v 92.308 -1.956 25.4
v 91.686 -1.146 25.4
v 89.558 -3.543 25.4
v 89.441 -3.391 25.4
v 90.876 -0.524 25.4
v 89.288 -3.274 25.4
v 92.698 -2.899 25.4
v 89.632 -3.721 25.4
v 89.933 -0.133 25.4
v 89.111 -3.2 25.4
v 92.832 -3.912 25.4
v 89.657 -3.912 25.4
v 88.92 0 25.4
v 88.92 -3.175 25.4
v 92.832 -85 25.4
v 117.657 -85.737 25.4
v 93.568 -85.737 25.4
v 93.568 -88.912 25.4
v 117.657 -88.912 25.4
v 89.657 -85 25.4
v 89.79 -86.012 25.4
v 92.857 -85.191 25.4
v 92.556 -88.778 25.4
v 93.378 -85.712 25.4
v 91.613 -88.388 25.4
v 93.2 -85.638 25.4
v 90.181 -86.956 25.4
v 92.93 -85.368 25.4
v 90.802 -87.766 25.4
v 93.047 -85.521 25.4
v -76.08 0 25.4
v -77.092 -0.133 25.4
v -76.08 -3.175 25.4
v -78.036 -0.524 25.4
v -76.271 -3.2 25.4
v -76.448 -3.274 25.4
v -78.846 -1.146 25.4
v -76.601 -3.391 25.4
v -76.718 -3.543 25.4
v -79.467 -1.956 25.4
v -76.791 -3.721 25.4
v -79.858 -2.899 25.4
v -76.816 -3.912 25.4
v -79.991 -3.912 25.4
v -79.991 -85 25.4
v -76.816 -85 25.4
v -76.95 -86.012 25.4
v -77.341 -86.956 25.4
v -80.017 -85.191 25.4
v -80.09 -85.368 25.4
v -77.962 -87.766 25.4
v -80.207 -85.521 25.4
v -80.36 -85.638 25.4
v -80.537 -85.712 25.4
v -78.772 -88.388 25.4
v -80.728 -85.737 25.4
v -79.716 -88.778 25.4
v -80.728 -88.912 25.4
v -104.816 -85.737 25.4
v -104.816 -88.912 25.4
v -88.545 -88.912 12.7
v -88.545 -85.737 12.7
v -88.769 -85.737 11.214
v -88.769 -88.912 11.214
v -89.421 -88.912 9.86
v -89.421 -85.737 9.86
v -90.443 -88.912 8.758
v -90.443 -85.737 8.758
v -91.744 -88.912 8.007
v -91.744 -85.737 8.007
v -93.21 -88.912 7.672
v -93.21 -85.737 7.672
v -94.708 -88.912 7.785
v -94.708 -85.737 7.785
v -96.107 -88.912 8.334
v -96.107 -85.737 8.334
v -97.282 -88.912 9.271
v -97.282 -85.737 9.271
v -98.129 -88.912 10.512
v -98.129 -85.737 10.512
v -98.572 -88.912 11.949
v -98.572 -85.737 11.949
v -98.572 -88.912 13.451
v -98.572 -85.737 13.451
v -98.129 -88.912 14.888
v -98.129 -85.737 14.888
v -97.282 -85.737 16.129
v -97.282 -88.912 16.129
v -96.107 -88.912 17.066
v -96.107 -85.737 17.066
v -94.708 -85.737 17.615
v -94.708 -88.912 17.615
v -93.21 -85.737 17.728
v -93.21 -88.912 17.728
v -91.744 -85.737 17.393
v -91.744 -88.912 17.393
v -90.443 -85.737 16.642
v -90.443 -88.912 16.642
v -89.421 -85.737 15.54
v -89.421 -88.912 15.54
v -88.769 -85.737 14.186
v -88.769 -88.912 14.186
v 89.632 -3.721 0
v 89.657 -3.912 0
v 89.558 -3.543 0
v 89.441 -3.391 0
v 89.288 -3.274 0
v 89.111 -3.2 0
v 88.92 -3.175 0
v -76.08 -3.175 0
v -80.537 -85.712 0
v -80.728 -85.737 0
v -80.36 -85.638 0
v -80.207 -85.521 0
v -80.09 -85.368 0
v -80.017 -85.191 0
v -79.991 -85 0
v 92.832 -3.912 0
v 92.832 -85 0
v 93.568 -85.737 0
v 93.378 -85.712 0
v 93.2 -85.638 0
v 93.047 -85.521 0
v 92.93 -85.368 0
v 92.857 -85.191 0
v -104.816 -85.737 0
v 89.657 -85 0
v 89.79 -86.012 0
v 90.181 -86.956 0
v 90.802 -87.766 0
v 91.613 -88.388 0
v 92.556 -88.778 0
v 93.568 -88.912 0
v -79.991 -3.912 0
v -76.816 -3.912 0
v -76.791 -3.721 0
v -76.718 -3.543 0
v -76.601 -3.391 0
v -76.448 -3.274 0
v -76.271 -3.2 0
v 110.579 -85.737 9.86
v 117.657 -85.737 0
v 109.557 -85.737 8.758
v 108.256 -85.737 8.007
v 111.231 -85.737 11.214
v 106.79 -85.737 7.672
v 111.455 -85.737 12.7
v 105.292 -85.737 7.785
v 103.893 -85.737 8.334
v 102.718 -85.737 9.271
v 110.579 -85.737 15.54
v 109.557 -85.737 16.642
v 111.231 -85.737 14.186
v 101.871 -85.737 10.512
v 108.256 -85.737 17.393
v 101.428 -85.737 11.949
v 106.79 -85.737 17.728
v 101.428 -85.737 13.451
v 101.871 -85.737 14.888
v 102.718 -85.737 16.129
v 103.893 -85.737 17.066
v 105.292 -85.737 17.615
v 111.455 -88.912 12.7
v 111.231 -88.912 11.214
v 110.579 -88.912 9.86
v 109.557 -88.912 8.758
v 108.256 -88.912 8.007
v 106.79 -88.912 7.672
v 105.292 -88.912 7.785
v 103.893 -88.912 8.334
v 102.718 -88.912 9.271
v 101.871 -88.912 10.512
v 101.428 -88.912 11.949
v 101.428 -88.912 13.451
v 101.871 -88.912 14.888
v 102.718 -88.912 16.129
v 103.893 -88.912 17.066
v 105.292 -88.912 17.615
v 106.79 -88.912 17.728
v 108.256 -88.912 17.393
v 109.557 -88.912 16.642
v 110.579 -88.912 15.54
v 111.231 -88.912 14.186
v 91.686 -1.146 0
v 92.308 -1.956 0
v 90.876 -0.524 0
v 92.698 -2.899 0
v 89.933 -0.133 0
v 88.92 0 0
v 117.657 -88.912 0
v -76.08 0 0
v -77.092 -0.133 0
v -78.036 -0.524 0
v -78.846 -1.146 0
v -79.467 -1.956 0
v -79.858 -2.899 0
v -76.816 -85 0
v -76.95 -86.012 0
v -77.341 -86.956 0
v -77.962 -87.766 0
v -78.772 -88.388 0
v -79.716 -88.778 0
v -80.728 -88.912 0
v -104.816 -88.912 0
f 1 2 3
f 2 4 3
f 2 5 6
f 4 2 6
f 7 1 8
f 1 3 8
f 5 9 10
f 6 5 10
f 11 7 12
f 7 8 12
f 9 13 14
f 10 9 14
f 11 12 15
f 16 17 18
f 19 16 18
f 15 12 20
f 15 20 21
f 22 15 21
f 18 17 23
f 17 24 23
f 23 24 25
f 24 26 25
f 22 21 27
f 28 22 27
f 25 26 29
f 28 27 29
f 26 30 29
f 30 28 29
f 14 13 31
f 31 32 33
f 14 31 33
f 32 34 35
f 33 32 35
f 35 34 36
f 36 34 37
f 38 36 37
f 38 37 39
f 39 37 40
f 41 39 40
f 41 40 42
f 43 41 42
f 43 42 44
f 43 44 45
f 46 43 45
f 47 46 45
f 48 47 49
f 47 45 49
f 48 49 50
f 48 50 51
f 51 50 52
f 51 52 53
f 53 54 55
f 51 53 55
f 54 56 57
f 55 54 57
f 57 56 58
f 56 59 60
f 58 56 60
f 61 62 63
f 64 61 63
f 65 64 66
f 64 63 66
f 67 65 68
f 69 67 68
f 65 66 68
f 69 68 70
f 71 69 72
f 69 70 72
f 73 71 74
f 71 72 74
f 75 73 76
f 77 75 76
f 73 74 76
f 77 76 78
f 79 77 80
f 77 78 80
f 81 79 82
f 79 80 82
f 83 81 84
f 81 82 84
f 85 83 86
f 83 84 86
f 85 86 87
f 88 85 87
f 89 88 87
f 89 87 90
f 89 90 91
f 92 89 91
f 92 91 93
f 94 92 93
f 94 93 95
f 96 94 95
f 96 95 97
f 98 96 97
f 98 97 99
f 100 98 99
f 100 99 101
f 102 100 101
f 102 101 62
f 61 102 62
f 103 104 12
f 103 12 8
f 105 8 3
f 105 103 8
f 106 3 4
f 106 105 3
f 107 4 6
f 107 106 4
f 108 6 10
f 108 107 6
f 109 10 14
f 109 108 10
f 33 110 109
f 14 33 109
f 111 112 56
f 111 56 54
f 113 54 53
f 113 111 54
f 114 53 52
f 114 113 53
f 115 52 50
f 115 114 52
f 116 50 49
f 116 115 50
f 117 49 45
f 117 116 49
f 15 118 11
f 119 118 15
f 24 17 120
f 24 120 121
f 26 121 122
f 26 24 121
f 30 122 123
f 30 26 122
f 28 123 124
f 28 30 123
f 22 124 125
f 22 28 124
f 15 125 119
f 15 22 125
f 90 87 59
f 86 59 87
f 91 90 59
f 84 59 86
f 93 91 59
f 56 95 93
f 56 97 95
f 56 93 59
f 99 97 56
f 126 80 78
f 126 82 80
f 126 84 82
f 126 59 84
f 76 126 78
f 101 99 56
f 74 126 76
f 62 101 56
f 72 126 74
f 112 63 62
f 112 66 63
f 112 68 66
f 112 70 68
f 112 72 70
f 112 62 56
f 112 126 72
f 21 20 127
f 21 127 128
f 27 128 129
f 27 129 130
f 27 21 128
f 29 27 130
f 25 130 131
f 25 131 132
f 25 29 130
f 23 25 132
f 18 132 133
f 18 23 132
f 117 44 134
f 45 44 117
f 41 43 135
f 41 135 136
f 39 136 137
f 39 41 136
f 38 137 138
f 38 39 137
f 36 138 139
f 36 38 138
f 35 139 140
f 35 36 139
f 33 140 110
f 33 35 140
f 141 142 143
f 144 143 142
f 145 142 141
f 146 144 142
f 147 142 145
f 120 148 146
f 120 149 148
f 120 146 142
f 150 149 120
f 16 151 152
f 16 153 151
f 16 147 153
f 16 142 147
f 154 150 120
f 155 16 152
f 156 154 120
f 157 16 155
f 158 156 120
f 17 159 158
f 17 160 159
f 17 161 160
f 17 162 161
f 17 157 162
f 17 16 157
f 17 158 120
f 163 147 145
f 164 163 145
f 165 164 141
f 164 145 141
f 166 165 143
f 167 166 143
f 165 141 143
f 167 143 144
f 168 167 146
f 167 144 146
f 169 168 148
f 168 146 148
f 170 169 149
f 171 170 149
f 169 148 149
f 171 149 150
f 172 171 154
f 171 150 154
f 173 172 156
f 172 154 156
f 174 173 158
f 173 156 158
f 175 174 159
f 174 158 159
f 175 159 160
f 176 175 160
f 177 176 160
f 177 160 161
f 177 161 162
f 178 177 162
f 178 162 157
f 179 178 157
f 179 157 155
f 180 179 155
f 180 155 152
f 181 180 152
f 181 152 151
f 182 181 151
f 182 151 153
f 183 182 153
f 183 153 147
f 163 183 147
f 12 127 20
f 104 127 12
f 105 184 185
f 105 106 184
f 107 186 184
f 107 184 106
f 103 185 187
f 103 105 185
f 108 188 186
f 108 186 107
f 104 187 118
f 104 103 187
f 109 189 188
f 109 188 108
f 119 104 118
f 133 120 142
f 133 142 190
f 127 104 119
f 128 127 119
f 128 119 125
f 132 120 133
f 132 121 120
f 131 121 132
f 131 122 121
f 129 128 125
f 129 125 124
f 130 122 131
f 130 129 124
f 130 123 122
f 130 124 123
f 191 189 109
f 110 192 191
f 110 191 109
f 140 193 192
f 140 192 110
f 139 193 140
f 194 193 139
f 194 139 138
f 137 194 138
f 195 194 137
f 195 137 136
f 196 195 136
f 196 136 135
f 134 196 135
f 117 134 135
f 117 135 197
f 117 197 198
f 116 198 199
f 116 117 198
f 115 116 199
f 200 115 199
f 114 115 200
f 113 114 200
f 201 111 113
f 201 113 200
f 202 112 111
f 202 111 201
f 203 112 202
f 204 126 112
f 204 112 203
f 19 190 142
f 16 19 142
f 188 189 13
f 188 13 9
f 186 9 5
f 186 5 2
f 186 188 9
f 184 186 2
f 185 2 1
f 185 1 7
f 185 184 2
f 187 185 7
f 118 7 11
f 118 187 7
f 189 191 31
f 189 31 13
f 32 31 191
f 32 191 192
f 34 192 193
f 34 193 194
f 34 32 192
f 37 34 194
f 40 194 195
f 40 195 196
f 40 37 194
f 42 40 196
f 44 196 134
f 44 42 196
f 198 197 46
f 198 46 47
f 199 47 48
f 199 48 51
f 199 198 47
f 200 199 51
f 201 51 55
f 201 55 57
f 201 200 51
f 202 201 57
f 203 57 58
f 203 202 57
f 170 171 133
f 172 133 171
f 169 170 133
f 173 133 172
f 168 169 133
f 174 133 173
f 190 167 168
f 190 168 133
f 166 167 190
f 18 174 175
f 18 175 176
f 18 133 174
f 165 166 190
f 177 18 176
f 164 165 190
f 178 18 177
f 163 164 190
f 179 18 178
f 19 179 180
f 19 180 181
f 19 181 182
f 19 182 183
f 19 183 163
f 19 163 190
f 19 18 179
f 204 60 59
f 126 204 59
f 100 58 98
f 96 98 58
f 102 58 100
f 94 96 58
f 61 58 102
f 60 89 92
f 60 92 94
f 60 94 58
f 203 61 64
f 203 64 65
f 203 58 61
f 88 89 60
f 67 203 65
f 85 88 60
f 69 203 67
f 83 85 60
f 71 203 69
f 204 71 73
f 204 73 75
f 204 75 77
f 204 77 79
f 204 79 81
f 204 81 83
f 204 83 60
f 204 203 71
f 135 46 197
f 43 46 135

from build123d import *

# Parameters (mm, degrees)
CROQUIS1_W                    = 165
CROQUIS1_H                    = 3.175
BRIDA_BASE1_DEPTH             = 25.4
BRIDA_DE_ARISTA1_DEPTH        = 25.4
BRIDA_DE_ARISTA1_BEND_DEPTH   = 25.4
BRIDA_DE_ARISTA2_DEPTH        = 25.4
BRIDA_DE_ARISTA2_BEND_DEPTH   = 25.4
TALADRO_DE_MARGEN_PARA_3_81_D = 10.0838


# Sheet-metal steps are written as plain solids
with BuildPart() as part:
    # Croquis1 → Brida base1 (new body)
    with BuildSketch(Plane.XY):
        with Locations((6.420112782, -1.5875)):
            Rectangle(CROQUIS1_W, CROQUIS1_H)
    extrude(amount=BRIDA_BASE1_DEPTH)

    # Brida de arista1 section (across the edge) → Brida de arista1 (add)
    with BuildSketch(Plane(origin=(89.656712782, -3.175, 0), x_dir=(-1, 0, 0), z_dir=(0, 0, 1))):
        with BuildLine():
            Line((-3.175, 0.7366), (-3.175, 81.825))
            Line((-3.175, 81.825), (0, 81.825))
            Line((0, 81.825), (0, 0.7366))
            ThreePointArc((0, 0.7366), (0.215745145, 0.215745145), (0.7366, 0))
            Line((0.7366, 0), (0.7366, -3.175))
            ThreePointArc((0.7366, -3.175), (-2.029318885, -2.029318885), (-3.175, 0.7366))
        make_face()
    extrude(amount=BRIDA_DE_ARISTA1_DEPTH)

    # Brida de arista1 section 2 (across the edge) → Brida de arista1 bend (add)
    with BuildSketch(Plane(origin=(-76.816487218, -3.175, 25.4), x_dir=(1, 0, 0), z_dir=(0, 0, -1))):
        with BuildLine():
            Line((-3.175, 0.7366), (-3.175, 81.825))
            Line((-3.175, 81.825), (0, 81.825))
            Line((0, 81.825), (0, 0.7366))
            ThreePointArc((0, 0.7366), (0.215745145, 0.215745145), (0.7366, 0))
            Line((0.7366, 0), (0.7366, -3.175))
            ThreePointArc((0.7366, -3.175), (-2.029318885, -2.029318885), (-3.175, 0.7366))
        make_face()
    extrude(amount=BRIDA_DE_ARISTA1_BEND_DEPTH)

    # Brida de arista2 section (across the edge) → Brida de arista2 (add)
    with BuildSketch(Plane(origin=(92.831712782, -85.7366, 25.4), x_dir=(0, 1, 0), z_dir=(0, 0, -1))):
        with BuildLine():
            Line((-3.175, 0.7366), (-3.175, 24.825))
            Line((-3.175, 24.825), (0, 24.825))
            Line((0, 24.825), (0, 0.7366))
            ThreePointArc((0, 0.7366), (0.215745145, 0.215745145), (0.7366, 0))
            Line((0.7366, 0), (0.7366, -3.175))
            ThreePointArc((0.7366, -3.175), (-2.029318885, -2.029318885), (-3.175, 0.7366))
        make_face()
    extrude(amount=BRIDA_DE_ARISTA2_DEPTH)

    # Brida de arista2 section 2 (across the edge) → Brida de arista2 bend (add)
    with BuildSketch(Plane(origin=(-79.991487218, -85.7366, 0), x_dir=(0, 1, 0), z_dir=(0, 0, 1))):
        with BuildLine():
            Line((-3.175, 0.7366), (-3.175, 24.825))
            Line((-3.175, 24.825), (0, 24.825))
            Line((0, 24.825), (0, 0.7366))
            ThreePointArc((0, 0.7366), (0.215745145, 0.215745145), (0.7366, 0))
            Line((0.7366, 0), (0.7366, -3.175))
            ThreePointArc((0.7366, -3.175), (-2.029318885, -2.029318885), (-3.175, 0.7366))
        make_face()
    extrude(amount=BRIDA_DE_ARISTA2_BEND_DEPTH)

    # Taladro de margen para 3/81 (through all)
    with Locations(Plane(origin=(0, -88.9116, 0), x_dir=(-1, 0, 0), z_dir=(0, -1, 0))):
        with Locations((93.586487218, -12.7), (-106.413512782, -12.7)):
            Hole(TALADRO_DE_MARGEN_PARA_3_81_D / 2)


solid = part.part
